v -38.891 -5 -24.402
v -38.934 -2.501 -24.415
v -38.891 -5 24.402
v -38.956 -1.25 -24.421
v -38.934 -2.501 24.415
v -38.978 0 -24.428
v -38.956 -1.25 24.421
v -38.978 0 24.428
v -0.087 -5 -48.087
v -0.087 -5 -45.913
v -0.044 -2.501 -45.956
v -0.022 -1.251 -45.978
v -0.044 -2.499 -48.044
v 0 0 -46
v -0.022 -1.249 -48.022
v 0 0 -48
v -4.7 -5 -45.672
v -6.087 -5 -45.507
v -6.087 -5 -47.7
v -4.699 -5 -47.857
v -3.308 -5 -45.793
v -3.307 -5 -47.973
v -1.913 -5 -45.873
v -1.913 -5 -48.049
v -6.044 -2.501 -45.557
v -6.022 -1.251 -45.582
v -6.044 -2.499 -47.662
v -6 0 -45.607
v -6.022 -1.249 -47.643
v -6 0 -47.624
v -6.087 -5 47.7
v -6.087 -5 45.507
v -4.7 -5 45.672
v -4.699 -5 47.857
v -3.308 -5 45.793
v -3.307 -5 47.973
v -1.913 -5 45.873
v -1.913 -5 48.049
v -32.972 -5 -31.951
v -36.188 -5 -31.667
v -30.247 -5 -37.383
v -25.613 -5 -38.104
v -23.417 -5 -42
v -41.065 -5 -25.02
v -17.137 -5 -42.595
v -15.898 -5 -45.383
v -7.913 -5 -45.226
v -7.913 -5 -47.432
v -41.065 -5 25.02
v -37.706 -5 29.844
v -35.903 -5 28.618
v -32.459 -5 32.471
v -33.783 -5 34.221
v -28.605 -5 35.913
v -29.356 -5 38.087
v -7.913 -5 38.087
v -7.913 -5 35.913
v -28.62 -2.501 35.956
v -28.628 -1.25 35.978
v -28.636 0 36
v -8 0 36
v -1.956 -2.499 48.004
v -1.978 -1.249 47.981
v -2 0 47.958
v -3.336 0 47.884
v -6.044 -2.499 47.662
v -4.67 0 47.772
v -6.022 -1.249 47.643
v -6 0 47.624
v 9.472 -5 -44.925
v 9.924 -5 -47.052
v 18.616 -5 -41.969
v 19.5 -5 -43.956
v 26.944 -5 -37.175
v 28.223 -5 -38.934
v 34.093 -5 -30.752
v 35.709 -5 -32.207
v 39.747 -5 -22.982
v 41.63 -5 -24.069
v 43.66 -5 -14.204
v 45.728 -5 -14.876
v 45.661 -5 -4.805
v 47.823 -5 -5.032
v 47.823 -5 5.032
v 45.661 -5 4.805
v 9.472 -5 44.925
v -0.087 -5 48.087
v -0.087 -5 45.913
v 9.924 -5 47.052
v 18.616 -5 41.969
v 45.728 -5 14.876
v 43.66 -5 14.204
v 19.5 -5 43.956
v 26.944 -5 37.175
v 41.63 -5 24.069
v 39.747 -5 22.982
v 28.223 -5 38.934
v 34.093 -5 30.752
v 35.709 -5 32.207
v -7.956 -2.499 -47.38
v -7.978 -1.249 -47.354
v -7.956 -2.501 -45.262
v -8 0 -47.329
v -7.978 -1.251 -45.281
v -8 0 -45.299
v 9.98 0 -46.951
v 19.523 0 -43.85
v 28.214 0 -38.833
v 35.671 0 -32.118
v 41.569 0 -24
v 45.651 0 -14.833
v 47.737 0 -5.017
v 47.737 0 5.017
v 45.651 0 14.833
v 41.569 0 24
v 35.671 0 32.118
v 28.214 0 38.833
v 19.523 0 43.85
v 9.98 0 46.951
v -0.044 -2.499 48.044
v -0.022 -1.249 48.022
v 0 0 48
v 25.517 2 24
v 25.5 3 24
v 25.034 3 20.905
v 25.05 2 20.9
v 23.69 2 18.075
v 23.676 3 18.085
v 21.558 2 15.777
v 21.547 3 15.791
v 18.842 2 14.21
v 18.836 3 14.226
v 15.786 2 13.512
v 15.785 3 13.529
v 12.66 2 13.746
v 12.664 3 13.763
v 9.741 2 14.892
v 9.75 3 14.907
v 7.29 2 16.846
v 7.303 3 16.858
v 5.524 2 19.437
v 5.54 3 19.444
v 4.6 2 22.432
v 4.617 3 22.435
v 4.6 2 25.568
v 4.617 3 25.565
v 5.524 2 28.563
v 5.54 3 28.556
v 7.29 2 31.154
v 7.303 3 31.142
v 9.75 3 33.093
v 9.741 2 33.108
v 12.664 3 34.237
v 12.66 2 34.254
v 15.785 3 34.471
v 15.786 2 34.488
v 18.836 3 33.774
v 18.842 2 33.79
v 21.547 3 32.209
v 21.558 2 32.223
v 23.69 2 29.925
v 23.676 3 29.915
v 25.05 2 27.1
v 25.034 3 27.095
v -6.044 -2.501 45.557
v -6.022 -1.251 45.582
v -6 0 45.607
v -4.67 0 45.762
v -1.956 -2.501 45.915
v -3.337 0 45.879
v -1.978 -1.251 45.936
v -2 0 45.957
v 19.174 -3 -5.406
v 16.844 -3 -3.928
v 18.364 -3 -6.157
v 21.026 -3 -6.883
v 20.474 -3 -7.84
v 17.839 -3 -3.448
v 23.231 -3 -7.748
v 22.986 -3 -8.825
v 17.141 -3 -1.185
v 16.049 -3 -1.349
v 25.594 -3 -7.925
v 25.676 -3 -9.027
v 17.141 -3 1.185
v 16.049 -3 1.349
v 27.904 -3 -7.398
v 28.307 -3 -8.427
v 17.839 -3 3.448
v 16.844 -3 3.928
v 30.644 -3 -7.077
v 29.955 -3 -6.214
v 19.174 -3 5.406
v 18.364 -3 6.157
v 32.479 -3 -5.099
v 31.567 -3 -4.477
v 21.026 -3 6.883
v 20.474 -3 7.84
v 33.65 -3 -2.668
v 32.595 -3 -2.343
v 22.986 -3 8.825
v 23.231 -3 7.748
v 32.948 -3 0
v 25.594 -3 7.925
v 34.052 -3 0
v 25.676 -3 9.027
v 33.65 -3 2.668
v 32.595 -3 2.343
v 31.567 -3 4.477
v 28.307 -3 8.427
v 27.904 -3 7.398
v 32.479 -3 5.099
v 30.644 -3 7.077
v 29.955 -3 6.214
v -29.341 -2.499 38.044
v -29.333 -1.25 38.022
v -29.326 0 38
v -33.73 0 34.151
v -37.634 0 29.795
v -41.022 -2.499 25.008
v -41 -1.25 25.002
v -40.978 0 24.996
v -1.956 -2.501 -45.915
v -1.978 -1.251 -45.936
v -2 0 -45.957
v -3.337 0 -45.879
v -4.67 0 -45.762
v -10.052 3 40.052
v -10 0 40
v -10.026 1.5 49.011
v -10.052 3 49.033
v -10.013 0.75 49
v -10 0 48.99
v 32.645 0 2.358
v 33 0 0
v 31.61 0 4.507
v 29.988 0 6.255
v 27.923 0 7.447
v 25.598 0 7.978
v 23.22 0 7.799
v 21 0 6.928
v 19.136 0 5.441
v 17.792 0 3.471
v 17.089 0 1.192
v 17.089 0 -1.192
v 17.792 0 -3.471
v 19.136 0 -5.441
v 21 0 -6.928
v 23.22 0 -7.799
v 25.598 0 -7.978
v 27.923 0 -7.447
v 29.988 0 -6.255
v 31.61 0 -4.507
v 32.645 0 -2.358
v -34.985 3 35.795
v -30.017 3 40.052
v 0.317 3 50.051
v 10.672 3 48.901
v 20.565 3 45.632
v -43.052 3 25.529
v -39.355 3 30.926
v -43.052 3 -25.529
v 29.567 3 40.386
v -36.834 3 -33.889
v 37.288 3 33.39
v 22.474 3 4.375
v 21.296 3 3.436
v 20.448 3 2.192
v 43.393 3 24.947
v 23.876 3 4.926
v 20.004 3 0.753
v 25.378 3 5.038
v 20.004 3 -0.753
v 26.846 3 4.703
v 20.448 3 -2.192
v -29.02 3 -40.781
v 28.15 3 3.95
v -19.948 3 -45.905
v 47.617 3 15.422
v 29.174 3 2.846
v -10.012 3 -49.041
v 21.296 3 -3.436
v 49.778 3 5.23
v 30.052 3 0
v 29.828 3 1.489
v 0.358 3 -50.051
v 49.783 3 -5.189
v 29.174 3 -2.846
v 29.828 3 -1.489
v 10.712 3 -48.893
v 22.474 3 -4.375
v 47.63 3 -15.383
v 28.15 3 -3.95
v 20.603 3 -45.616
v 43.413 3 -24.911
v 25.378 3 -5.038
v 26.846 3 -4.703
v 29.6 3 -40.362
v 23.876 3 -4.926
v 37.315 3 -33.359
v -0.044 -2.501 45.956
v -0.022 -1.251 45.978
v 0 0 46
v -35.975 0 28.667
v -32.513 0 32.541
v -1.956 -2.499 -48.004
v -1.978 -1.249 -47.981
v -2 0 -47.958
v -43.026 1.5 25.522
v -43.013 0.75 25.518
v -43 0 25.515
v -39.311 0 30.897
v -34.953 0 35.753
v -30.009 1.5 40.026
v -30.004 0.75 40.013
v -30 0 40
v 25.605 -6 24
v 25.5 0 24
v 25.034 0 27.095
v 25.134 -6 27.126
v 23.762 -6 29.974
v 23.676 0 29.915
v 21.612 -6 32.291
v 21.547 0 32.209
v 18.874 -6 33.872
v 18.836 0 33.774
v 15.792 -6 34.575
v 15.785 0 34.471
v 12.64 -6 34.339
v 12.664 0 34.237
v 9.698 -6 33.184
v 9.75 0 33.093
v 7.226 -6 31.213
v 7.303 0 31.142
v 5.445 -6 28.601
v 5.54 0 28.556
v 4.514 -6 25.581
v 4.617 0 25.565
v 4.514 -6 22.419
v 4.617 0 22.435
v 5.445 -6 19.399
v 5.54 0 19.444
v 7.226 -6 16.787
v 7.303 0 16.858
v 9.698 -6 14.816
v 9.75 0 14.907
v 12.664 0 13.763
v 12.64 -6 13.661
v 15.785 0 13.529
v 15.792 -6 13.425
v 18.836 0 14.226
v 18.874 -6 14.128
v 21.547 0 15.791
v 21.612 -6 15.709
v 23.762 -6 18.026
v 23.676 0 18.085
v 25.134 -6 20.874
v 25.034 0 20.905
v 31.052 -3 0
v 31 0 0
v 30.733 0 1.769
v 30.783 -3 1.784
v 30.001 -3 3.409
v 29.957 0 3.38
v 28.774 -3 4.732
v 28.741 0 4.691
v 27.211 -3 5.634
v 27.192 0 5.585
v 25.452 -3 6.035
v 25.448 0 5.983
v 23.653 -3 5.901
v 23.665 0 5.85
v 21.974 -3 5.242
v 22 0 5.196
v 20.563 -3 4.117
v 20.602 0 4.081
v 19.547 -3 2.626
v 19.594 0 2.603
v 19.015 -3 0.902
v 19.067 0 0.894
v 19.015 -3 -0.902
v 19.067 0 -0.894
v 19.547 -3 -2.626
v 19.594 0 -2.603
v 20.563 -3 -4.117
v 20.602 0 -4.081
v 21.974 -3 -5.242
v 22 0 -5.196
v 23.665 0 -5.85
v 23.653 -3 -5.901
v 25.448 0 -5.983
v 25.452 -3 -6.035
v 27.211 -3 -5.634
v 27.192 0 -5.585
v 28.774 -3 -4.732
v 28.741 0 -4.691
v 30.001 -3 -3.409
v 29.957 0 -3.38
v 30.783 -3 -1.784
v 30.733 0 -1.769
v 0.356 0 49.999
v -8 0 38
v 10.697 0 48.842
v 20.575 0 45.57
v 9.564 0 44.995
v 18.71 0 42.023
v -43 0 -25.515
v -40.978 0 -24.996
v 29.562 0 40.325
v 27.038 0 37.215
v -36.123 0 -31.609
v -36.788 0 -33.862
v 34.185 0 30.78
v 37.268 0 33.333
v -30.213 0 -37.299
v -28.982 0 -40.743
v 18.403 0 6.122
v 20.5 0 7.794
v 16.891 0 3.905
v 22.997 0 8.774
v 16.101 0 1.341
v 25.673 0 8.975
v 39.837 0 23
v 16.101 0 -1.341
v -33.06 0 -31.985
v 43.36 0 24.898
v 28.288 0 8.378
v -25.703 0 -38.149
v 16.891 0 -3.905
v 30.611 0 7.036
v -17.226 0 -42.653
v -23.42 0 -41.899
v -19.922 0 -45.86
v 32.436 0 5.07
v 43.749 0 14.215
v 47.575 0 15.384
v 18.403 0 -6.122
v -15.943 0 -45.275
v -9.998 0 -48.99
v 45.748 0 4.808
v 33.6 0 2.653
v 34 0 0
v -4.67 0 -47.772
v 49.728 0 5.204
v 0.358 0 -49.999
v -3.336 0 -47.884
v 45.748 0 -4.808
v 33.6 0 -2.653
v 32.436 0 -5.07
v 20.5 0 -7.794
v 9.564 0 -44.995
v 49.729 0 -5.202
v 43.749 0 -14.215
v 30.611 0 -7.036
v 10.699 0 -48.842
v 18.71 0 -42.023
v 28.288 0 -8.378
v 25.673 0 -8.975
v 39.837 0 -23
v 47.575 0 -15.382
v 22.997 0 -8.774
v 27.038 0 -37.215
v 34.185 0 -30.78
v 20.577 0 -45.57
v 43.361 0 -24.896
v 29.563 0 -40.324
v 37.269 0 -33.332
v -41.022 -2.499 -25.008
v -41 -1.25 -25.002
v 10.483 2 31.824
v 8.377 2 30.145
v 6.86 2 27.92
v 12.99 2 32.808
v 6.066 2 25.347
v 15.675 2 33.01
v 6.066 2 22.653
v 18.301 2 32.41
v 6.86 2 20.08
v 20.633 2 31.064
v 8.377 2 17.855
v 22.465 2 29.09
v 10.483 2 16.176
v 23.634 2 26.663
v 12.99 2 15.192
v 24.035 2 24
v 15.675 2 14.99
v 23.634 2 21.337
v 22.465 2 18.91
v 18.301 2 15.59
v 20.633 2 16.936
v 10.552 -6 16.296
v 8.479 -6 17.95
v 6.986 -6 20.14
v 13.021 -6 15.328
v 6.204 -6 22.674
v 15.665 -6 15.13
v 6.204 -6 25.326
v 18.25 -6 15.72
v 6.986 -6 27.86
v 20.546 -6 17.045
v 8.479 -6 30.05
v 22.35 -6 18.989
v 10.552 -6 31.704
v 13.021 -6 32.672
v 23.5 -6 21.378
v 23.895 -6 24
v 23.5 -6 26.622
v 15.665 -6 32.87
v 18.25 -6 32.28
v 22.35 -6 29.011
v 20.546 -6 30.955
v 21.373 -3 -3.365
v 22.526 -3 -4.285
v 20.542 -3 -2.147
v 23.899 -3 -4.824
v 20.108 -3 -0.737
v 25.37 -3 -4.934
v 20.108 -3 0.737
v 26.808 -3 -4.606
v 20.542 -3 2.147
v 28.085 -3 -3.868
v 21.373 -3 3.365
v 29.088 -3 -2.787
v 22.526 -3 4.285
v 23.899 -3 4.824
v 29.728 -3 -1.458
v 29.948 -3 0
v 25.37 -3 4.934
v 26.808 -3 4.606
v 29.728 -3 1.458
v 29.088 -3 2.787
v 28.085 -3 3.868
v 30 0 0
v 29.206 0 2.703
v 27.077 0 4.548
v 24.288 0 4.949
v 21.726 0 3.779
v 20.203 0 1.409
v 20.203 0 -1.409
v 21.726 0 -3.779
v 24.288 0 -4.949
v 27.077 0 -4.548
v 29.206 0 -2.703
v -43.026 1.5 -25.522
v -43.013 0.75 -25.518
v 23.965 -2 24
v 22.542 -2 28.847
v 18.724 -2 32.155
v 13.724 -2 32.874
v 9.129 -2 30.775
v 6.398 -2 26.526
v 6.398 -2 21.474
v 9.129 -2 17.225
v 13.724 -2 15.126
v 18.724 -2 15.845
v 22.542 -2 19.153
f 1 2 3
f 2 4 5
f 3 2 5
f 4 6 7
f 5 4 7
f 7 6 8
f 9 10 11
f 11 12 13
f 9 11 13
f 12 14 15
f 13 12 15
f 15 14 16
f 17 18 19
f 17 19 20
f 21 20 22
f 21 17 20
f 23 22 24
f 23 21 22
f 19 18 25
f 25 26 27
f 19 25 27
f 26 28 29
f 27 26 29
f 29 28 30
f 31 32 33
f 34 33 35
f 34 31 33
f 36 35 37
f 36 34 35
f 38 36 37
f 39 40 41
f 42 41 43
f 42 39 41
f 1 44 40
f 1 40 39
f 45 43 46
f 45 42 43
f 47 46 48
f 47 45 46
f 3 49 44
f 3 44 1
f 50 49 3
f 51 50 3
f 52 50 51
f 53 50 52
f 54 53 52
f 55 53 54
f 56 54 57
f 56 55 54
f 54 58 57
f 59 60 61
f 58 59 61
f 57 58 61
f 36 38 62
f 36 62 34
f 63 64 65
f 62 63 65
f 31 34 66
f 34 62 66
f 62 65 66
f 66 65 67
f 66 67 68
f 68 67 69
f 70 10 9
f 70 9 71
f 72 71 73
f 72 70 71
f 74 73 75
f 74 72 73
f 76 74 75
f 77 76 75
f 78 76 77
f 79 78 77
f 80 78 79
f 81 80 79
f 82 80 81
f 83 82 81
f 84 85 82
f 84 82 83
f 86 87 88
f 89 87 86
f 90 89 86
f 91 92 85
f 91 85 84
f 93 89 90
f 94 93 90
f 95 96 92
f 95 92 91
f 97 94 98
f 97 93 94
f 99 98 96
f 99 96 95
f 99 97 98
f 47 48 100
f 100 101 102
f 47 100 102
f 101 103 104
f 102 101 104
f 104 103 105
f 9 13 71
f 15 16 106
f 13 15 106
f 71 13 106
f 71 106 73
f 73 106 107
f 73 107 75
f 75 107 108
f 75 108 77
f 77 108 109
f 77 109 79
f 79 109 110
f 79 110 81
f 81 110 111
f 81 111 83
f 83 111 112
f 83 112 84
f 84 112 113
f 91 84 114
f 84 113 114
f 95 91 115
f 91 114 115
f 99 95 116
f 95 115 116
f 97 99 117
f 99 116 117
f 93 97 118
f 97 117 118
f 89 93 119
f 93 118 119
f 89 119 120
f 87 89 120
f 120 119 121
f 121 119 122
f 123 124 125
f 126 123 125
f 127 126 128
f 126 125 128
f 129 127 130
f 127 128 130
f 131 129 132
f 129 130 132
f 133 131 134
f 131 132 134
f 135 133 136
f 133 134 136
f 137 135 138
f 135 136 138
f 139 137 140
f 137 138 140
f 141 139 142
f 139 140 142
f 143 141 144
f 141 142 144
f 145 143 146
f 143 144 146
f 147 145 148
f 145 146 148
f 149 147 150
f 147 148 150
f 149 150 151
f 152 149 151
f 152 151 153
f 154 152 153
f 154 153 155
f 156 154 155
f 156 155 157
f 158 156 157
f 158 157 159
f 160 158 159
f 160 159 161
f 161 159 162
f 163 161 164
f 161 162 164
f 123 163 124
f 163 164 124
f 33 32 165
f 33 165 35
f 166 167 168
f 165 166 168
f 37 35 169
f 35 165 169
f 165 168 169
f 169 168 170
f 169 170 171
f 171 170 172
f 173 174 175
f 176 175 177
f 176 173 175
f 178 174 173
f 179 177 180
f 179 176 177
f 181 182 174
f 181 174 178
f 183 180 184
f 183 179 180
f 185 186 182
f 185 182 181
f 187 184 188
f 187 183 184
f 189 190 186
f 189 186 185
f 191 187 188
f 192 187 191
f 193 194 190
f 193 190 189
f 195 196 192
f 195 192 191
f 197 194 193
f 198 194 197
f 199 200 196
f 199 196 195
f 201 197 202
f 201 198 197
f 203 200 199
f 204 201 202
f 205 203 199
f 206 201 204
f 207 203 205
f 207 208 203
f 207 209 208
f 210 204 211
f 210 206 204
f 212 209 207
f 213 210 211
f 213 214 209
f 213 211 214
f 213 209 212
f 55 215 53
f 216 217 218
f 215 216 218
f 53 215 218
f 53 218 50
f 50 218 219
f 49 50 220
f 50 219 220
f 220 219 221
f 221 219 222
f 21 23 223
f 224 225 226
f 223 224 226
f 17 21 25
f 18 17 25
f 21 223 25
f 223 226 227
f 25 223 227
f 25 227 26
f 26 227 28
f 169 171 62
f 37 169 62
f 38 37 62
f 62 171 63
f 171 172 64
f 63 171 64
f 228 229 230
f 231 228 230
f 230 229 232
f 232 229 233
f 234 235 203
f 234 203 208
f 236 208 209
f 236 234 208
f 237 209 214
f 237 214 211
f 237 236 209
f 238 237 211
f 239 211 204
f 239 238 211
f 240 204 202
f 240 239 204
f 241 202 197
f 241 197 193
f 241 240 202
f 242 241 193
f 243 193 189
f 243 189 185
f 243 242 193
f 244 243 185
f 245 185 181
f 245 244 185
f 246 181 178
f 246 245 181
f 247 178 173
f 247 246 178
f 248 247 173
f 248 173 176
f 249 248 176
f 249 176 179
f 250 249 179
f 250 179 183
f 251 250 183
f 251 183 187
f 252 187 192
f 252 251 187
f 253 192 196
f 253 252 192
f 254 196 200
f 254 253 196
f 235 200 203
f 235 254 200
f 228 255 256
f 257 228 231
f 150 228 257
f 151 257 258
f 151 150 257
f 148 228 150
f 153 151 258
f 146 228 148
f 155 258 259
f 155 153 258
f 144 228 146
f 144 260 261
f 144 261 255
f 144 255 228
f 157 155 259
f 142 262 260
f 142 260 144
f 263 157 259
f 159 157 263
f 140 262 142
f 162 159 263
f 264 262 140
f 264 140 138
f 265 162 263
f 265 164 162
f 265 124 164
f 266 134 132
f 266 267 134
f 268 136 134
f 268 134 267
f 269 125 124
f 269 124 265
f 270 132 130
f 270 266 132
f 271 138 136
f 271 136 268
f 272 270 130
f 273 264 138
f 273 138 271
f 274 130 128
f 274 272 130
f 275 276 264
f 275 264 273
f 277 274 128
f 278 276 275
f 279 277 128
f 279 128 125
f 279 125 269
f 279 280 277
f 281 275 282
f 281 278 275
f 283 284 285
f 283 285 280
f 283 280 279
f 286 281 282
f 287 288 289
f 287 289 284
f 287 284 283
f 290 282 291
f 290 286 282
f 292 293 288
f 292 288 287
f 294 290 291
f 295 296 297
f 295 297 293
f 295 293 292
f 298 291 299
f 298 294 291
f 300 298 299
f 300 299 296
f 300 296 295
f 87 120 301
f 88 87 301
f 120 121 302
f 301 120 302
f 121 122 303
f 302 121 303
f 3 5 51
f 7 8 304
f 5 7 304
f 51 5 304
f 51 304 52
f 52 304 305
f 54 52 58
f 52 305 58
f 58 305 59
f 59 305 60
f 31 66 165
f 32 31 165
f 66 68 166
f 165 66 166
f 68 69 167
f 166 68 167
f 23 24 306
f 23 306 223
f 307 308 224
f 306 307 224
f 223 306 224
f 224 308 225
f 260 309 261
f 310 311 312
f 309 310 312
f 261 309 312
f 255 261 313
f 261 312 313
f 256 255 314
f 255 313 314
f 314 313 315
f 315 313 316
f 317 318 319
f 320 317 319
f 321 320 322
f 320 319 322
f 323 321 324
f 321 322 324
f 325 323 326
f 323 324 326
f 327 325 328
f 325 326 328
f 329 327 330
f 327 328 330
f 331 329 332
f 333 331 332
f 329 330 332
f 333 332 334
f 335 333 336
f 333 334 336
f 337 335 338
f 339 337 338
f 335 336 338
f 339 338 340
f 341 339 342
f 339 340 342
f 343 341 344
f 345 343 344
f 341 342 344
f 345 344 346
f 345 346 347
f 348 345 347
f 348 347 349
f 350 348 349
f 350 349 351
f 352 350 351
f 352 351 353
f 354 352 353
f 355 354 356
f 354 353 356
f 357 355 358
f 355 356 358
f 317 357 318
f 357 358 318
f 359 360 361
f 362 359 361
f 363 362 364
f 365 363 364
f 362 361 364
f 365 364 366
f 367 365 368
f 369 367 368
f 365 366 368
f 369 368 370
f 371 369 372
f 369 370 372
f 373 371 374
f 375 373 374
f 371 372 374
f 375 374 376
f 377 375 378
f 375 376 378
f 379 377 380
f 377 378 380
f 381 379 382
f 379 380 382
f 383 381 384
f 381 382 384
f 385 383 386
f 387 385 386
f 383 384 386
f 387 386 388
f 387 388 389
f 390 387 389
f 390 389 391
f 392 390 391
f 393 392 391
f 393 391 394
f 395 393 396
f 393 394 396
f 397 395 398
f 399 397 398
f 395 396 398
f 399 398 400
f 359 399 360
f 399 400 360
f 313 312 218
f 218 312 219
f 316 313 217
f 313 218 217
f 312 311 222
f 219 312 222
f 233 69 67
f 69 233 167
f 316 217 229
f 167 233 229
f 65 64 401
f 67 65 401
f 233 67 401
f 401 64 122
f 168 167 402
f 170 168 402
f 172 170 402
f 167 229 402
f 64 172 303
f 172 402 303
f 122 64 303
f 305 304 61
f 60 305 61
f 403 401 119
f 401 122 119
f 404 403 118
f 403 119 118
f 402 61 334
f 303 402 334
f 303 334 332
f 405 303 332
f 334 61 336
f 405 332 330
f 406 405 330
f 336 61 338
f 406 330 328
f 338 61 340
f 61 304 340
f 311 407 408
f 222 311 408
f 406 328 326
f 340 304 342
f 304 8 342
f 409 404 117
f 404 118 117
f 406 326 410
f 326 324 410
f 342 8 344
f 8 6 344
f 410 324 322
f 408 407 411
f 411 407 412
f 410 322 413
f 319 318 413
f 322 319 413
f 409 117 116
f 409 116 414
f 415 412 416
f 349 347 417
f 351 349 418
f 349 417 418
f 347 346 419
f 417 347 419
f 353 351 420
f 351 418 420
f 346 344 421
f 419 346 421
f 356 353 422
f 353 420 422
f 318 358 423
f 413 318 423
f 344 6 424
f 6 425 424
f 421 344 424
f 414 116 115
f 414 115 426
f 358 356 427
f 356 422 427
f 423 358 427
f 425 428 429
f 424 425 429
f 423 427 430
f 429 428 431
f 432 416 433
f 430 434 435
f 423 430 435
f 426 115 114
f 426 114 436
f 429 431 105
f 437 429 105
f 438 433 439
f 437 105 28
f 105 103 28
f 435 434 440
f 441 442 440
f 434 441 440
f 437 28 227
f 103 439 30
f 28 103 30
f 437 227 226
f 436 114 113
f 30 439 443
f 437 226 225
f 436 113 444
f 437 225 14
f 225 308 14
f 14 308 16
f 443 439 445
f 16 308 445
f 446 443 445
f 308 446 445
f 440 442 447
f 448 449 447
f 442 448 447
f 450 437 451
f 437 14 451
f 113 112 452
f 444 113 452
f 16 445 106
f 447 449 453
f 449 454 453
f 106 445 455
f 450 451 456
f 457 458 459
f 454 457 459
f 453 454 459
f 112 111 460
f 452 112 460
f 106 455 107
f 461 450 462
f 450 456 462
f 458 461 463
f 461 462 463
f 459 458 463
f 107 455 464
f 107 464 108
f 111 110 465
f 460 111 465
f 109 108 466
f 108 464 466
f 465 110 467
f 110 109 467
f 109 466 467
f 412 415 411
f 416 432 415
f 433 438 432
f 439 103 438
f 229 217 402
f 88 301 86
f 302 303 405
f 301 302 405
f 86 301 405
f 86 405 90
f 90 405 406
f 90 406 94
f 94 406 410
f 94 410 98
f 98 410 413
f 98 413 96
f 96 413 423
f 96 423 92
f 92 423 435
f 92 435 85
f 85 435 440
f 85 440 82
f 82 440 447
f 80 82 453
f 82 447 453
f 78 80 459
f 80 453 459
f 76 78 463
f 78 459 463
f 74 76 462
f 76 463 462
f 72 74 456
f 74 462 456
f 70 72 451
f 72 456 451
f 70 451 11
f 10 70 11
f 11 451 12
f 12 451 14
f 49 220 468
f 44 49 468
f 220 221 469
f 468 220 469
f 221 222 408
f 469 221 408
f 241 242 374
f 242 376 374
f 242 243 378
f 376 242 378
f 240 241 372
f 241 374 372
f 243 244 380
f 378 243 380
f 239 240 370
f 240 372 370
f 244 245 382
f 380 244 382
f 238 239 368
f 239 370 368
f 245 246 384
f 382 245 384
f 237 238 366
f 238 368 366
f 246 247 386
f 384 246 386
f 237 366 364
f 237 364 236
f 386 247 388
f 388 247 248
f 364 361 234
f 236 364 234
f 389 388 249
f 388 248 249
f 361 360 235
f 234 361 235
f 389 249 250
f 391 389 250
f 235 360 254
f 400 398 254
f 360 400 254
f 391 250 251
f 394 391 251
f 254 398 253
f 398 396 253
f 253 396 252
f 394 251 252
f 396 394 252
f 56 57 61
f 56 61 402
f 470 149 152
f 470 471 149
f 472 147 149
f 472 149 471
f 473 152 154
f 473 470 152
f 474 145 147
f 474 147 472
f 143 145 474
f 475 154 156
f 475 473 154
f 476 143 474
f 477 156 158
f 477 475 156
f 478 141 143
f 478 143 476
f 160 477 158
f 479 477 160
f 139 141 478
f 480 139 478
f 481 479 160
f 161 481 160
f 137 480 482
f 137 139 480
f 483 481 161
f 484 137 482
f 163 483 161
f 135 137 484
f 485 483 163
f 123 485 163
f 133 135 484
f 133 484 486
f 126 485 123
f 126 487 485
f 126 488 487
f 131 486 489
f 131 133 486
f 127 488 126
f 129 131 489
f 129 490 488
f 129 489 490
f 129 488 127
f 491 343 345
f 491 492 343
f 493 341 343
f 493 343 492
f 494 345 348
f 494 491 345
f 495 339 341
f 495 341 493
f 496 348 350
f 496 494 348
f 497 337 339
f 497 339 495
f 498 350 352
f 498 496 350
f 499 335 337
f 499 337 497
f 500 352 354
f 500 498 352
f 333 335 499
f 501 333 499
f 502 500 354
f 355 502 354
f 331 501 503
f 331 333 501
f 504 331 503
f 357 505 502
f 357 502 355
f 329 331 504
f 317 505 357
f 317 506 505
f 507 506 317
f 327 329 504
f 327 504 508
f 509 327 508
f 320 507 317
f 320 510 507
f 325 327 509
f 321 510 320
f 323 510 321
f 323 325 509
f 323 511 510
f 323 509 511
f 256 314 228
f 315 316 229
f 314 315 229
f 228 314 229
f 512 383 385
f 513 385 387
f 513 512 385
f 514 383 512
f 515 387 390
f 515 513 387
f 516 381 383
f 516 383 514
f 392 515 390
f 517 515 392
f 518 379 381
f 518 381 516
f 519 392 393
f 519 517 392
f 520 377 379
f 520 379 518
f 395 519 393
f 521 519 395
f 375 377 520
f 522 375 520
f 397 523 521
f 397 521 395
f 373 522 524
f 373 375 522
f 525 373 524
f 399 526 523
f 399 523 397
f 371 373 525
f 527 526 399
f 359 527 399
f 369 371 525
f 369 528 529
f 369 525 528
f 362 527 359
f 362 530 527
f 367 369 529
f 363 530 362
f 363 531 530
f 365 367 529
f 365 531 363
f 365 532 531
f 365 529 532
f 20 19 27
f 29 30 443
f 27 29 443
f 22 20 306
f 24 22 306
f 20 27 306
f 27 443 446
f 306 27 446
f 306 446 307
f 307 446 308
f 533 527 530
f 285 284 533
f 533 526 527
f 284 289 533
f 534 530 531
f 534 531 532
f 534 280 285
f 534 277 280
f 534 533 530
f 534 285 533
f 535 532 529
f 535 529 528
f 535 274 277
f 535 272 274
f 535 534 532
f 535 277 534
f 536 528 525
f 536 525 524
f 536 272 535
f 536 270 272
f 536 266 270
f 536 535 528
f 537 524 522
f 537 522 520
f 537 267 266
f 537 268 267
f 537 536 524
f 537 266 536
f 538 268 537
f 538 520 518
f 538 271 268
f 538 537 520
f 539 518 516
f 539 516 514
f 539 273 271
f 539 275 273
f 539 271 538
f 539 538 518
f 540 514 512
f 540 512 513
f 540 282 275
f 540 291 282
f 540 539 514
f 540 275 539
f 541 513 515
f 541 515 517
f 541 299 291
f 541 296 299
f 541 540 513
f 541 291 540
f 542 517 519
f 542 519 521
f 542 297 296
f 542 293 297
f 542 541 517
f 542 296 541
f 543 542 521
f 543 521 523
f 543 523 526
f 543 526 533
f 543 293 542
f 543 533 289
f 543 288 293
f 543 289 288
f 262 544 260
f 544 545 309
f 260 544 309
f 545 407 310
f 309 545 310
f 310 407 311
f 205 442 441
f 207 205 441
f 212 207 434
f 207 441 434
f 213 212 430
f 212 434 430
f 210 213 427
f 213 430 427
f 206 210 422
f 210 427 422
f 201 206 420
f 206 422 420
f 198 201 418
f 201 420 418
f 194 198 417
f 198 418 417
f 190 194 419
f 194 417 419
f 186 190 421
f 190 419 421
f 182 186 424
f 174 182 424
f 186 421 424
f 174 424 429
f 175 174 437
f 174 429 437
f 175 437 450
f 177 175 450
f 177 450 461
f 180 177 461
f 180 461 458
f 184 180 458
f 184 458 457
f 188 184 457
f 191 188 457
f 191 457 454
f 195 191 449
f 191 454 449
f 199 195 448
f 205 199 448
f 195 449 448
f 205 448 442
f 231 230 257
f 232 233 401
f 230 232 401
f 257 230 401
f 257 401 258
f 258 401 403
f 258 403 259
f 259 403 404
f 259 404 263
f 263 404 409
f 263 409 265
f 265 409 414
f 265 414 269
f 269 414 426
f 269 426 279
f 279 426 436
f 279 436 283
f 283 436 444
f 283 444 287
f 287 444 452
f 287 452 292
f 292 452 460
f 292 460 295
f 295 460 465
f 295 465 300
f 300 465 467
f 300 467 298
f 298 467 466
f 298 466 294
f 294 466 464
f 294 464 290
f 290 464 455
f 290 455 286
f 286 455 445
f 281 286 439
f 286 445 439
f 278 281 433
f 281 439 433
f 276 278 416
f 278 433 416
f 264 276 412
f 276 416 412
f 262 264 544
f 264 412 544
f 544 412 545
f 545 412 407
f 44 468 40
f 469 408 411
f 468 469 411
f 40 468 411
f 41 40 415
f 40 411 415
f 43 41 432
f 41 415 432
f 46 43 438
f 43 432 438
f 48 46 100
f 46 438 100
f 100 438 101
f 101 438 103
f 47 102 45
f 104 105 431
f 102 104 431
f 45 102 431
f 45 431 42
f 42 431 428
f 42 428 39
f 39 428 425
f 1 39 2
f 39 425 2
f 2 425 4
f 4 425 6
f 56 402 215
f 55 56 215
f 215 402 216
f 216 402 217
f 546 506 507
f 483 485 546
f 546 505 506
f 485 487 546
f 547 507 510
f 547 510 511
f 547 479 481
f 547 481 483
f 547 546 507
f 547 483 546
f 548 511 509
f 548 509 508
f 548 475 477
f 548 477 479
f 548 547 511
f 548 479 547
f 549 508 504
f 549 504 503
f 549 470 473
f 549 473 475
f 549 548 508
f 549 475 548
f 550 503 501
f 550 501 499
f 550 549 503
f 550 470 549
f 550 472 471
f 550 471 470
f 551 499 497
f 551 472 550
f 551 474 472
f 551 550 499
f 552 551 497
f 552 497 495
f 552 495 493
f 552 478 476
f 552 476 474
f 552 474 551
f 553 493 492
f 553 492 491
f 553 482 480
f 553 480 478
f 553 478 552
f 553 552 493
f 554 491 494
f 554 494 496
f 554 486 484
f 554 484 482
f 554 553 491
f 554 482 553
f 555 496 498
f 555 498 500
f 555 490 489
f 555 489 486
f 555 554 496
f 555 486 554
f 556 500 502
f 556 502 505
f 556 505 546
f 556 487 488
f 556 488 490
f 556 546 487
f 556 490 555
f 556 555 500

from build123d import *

# Parameters (mm, degrees)
BOSS_EXTRUDE1_DEPTH           = 3
BOSS_EXTRUDE1_DRAFT           = -1
BOSS_EXTRUDE2_DEPTH           = 5
BOSS_EXTRUDE2_DRAFT           = -1
BOSS_EXTRUDE2_PROFILE_2_DEPTH = 5
BOSS_EXTRUDE2_PROFILE_2_DRAFT = -1
BOSS_EXTRUDE2_PROFILE_3_DEPTH = 5
BOSS_EXTRUDE2_PROFILE_3_DRAFT = -1
BOSS_EXTRUDE2_PROFILE_4_DEPTH = 5
BOSS_EXTRUDE2_PROFILE_4_DRAFT = -1
SKETCH3_R                     = 5
CUT_EXTRUDE1_DEPTH            = 3
CUT_EXTRUDE1_DRAFT            = 1
SKETCH3_R_2                   = 9
CUT_EXTRUDE1_PROFILE_2_DEPTH  = 3
CUT_EXTRUDE1_PROFILE_2_DRAFT  = 1
SKETCH4_R                     = 9
SKETCH4_R_2                   = 8
BOSS_EXTRUDE3_DEPTH           = 3
BOSS_EXTRUDE3_DRAFT           = -1
SKETCH4_3_R                   = 6
SKETCH4_3_R_2                 = 5
BOSS_EXTRUDE4_DEPTH           = 3
BOSS_EXTRUDE4_DRAFT           = -1
SKETCH6_R                     = 10.5
SKETCH6_R_2                   = 9
BOSS_EXTRUDE5_DEPTH           = 6
BOSS_EXTRUDE5_DRAFT           = -1
SKETCH7_R                     = 10.5
SKETCH7_R_2                   = 9
CUT_EXTRUDE2_DEPTH            = 1
CUT_EXTRUDE2_DRAFT            = 1


with BuildPart() as part:
    # Sketch1 → Boss-Extrude1 (with draft: the straight prism first)
    with BuildSketch(Plane(origin=(0, 0, 0), x_dir=(1, 0, 0), z_dir=(0, 1, 0))):
        with BuildLine():
            Line((-43, 25.514701644), (-43, -25.514701644))
            ThreePointArc((-43, -25.514701644), (-37.211637523, -33.396018219), (-30, -40))
            Line((-30, -40), (-10, -40))
            Line((-10, -40), (-10, -48.989794856))
            ThreePointArc((-10, -48.989794856), (45.716299059, 20.248950598), (-43, 25.514701644))
        make_face()
    extrude(amount=BOSS_EXTRUDE1_DEPTH)
    # Boss-Extrude1: the draft: its side faces are tilted about the plane it starts from
    boss_extrude1_sides = [part.faces().sort_by_distance(p)[0] for p in [
        (-43, 1.5, 0),
        (-37.211637523, 1.5, 33.396018219),
        (-20, 1.5, 40),
        (-10, 1.5, 44.494897428),
        (45.716299059, 1.5, -20.248950598),
    ]]
    draft(boss_extrude1_sides, Plane(origin=(0, 0, 0), x_dir=(1, 0, 0), z_dir=(0, 1, 0)), BOSS_EXTRUDE1_DRAFT)


with BuildPart() as boss_extrude2_tool:
    # Sketch2 → Boss-Extrude2 (with draft: the straight prism first)
    with BuildSketch(Plane.XZ):
        with BuildLine():
            Line((-40.978122, 24.995870006), (-40.978122, -24.995870006))
            ThreePointArc((-40.978122, -24.995870006), (-26.914721681, -39.744153744), (-8, -47.328638265))
            Line((-8, -47.328638265), (-8, -45.299006612))
            ThreePointArc((-8, -45.299006612), (-25.702922785, -38.149177715), (-38.978122, -24.427566505))
            Line((-38.978122, -24.427566505), (-38.978122, 24.427566505))
            ThreePointArc((-38.978122, 24.427566505), (-34.298477795, 30.653130687), (-28.635642127, 36))
            Line((-28.635642127, 36), (-8, 36))
            Line((-8, 36), (-8, 38))
            Line((-8, 38), (-29.325756597, 38))
            ThreePointArc((-29.325756597, 38), (-35.748226329, 32.032238672), (-40.978122, 24.995870006))
        make_face()
    extrude(amount=BOSS_EXTRUDE2_DEPTH)
    # Boss-Extrude2: the draft: its side faces are tilted about the plane it starts from
    boss_extrude2_sides = [boss_extrude2_tool.faces().sort_by_distance(p)[0] for p in [
        (-38.978122, -2.5, 0),
        (-34.298477795, -2.5, 30.653130687),
        (-18.317821063, -2.5, 36),
        (-8, -2.5, 37),
        (-18.662878299, -2.5, 38),
        (-35.748226329, -2.5, 32.032238672),
        (-40.978122, -2.5, 0),
        (-26.914721681, -2.5, -39.744153744),
        (-8, -2.5, -46.313822438),
        (-25.702922785, -2.5, -38.149177715),
    ]]
    draft(boss_extrude2_sides, Plane.XZ, BOSS_EXTRUDE2_DRAFT)


with BuildPart() as part_1:
    add(part.part)

    # Boss-Extrude2: add boss_extrude2_tool
    add(boss_extrude2_tool.part)


with BuildPart() as boss_extrude2_profile_2_tool:
    # Sketch2 → Boss-Extrude2 profile 2 (with draft: the straight prism first)
    with BuildSketch(Plane.XZ):
        with BuildLine():
            ThreePointArc((-6, 45.607017004), (-4.00381503, 45.825423786), (-2, 45.956501172))
            Line((-2, 45.956501172), (-2, 47.958315233))
            ThreePointArc((-2, 47.958315233), (-4.003501138, 47.832750064), (-6, 47.623523599))
            Line((-6, 47.623523599), (-6, 45.607017004))
        make_face()
    extrude(amount=BOSS_EXTRUDE2_PROFILE_2_DEPTH)
    # Boss-Extrude2 profile 2: the draft: its side faces are tilted about the plane it starts from
    boss_extrude2_profile_2_sides = [boss_extrude2_profile_2_tool.faces().sort_by_distance(p)[0] for p in [
        (-4.00381503, -2.5, 45.825423786),
        (-2, -2.5, 46.957408203),
        (-4.003501138, -2.5, 47.832750064),
        (-6, -2.5, 46.615270302),
    ]]
    draft(boss_extrude2_profile_2_sides, Plane.XZ, BOSS_EXTRUDE2_PROFILE_2_DRAFT)


with BuildPart() as part_2:
    add(part_1.part)

    # Boss-Extrude2 profile 2: add boss_extrude2_profile_2_tool
    add(boss_extrude2_profile_2_tool.part)


with BuildPart() as boss_extrude2_profile_3_tool:
    # Sketch2 → Boss-Extrude2 profile 3 (with draft: the straight prism first)
    with BuildSketch(Plane.XZ):
        with BuildLine():
            Line((-6, -45.607017004), (-6, -47.623523599))
            ThreePointArc((-6, -47.623523599), (-4.003501138, -47.832750064), (-2, -47.958315233))
            Line((-2, -47.958315233), (-2, -45.956501172))
            ThreePointArc((-2, -45.956501172), (-4.00381503, -45.825423786), (-6, -45.607017004))
        make_face()
    extrude(amount=BOSS_EXTRUDE2_PROFILE_3_DEPTH)
    # Boss-Extrude2 profile 3: the draft: its side faces are tilted about the plane it starts from
    boss_extrude2_profile_3_sides = [boss_extrude2_profile_3_tool.faces().sort_by_distance(p)[0] for p in [
        (-4.00381503, -2.5, -45.825423786),
        (-6, -2.5, -46.615270302),
        (-4.003501138, -2.5, -47.832750064),
        (-2, -2.5, -46.957408203),
    ]]
    draft(boss_extrude2_profile_3_sides, Plane.XZ, BOSS_EXTRUDE2_PROFILE_3_DRAFT)


with BuildPart() as part_3:
    add(part_2.part)

    # Boss-Extrude2 profile 3: add boss_extrude2_profile_3_tool
    add(boss_extrude2_profile_3_tool.part)


with BuildPart() as boss_extrude2_profile_4_tool:
    # Sketch2 → Boss-Extrude2 profile 4 (with draft: the straight prism first)
    with BuildSketch(Plane.XZ):
        with BuildLine():
            ThreePointArc((0, 46), (46, 0), (0, -46))
            Line((0, -46), (0, -48))
            ThreePointArc((0, -48), (48, 0), (0, 48))
            Line((0, 48), (0, 46))
        make_face()
    extrude(amount=BOSS_EXTRUDE2_PROFILE_4_DEPTH)
    # Boss-Extrude2 profile 4: the draft: its side faces are tilted about the plane it starts from
    boss_extrude2_profile_4_sides = [boss_extrude2_profile_4_tool.faces().sort_by_distance(p)[0] for p in [
        (0, -2.5, -47),
        (48, -2.5, 0),
        (0, -2.5, 47),
        (46, -2.5, 0),
    ]]
    draft(boss_extrude2_profile_4_sides, Plane.XZ, BOSS_EXTRUDE2_PROFILE_4_DRAFT)


with BuildPart() as part_4:
    add(part_3.part)

    # Boss-Extrude2 profile 4: add boss_extrude2_profile_4_tool
    add(boss_extrude2_profile_4_tool.part)


with BuildPart() as cut_extrude1_tool:
    # Sketch3 → Cut-Extrude1 (with draft: the straight prism first)
    with BuildSketch(Plane.XZ):
        with Locations((25, 0)):
            Circle(SKETCH3_R)
    extrude(amount=-CUT_EXTRUDE1_DEPTH)
    # Cut-Extrude1: the draft: its side faces are tilted about the plane it starts from
    cut_extrude1_sides = [cut_extrude1_tool.faces().sort_by_distance(p)[0] for p in [
        (20, 1.5, 0),
    ]]
    draft(cut_extrude1_sides, Plane.XZ, CUT_EXTRUDE1_DRAFT)


with BuildPart() as part_5:
    add(part_4.part)

    # Cut-Extrude1: cut by cut_extrude1_tool
    add(cut_extrude1_tool.part, mode=Mode.SUBTRACT)


with BuildPart() as cut_extrude1_profile_2_tool:
    # Sketch3 → Cut-Extrude1 profile 2 (with draft: the straight prism first)
    with BuildSketch(Plane.XZ):
        with Locations((15, 24)):
            Circle(SKETCH3_R_2)
    extrude(amount=-CUT_EXTRUDE1_PROFILE_2_DEPTH)
    # Cut-Extrude1 profile 2: the draft: its side faces are tilted about the plane it starts from
    cut_extrude1_profile_2_sides = [cut_extrude1_profile_2_tool.faces().sort_by_distance(p)[0] for p in [
        (6, 1.5, 24),
    ]]
    draft(cut_extrude1_profile_2_sides, Plane.XZ, CUT_EXTRUDE1_PROFILE_2_DRAFT)


with BuildPart() as part_6:
    add(part_5.part)

    # Cut-Extrude1 profile 2: cut by cut_extrude1_profile_2_tool
    add(cut_extrude1_profile_2_tool.part, mode=Mode.SUBTRACT)


with BuildPart() as boss_extrude3_tool:
    # Sketch4 → Boss-Extrude3 (with draft: the straight prism first)
    with BuildSketch(Plane.XZ):
        with Locations((25, 0)):
            Circle(SKETCH4_R)
        with Locations((25, 0)):
            Circle(SKETCH4_R_2, mode=Mode.SUBTRACT)
    extrude(amount=BOSS_EXTRUDE3_DEPTH)
    # Boss-Extrude3: the draft: its side faces are tilted about the plane it starts from
    boss_extrude3_sides = [boss_extrude3_tool.faces().sort_by_distance(p)[0] for p in [
        (16, -1.5, 0),
        (17, -1.5, 0),
    ]]
    draft(boss_extrude3_sides, Plane.XZ, BOSS_EXTRUDE3_DRAFT)


with BuildPart() as part_7:
    add(part_6.part)

    # Boss-Extrude3: add boss_extrude3_tool
    add(boss_extrude3_tool.part)


with BuildPart() as boss_extrude4_tool:
    # Sketch4<3> → Boss-Extrude4 (with draft: the straight prism first)
    with BuildSketch(Plane.XZ):
        with Locations((25, 0)):
            Circle(SKETCH4_3_R)
        with Locations((25, 0)):
            Circle(SKETCH4_3_R_2, mode=Mode.SUBTRACT)
    extrude(amount=BOSS_EXTRUDE4_DEPTH)
    # Boss-Extrude4: the draft: its side faces are tilted about the plane it starts from
    boss_extrude4_sides = [boss_extrude4_tool.faces().sort_by_distance(p)[0] for p in [
        (19, -1.5, 0),
        (20, -1.5, 0),
    ]]
    draft(boss_extrude4_sides, Plane.XZ, BOSS_EXTRUDE4_DRAFT)


with BuildPart() as part_8:
    add(part_7.part)

    # Boss-Extrude4: add boss_extrude4_tool
    add(boss_extrude4_tool.part)


with BuildPart() as boss_extrude5_tool:
    # Sketch6 → Boss-Extrude5 (with draft: the straight prism first)
    with BuildSketch(Plane.XZ):
        with Locations((15, 24)):
            Circle(SKETCH6_R)
        with Locations((15, 24)):
            Circle(SKETCH6_R_2, mode=Mode.SUBTRACT)
    extrude(amount=BOSS_EXTRUDE5_DEPTH)
    # Boss-Extrude5: the draft: its side faces are tilted about the plane it starts from
    boss_extrude5_sides = [boss_extrude5_tool.faces().sort_by_distance(p)[0] for p in [
        (4.5, -3, 24),
        (6, -3, 24),
    ]]
    draft(boss_extrude5_sides, Plane.XZ, BOSS_EXTRUDE5_DRAFT)


with BuildPart() as part_9:
    add(part_8.part)

    # Boss-Extrude5: add boss_extrude5_tool
    add(boss_extrude5_tool.part)


with BuildPart() as cut_extrude2_tool:
    # Sketch7 → Cut-Extrude2 (with draft: the straight prism first)
    with BuildSketch(Plane(origin=(0, 3, 0), x_dir=(1, 0, 0), z_dir=(0, 1, 0))):
        with Locations((15, -24)):
            Circle(SKETCH7_R)
        with Locations((15, -24)):
            Circle(SKETCH7_R_2, mode=Mode.SUBTRACT)
    extrude(amount=-CUT_EXTRUDE2_DEPTH)
    # Cut-Extrude2: the draft: its side faces are tilted about the plane it starts from
    cut_extrude2_sides = [cut_extrude2_tool.faces().sort_by_distance(p)[0] for p in [
        (4.5, 2.5, 24),
        (6, 2.5, 24),
    ]]
    draft(cut_extrude2_sides, Plane(origin=(0, 3, 0), x_dir=(1, 0, 0), z_dir=(0, 1, 0)), CUT_EXTRUDE2_DRAFT)


with BuildPart() as part_10:
    add(part_9.part)

    # Cut-Extrude2: cut by cut_extrude2_tool
    add(cut_extrude2_tool.part, mode=Mode.SUBTRACT)


solid = part_10.part
